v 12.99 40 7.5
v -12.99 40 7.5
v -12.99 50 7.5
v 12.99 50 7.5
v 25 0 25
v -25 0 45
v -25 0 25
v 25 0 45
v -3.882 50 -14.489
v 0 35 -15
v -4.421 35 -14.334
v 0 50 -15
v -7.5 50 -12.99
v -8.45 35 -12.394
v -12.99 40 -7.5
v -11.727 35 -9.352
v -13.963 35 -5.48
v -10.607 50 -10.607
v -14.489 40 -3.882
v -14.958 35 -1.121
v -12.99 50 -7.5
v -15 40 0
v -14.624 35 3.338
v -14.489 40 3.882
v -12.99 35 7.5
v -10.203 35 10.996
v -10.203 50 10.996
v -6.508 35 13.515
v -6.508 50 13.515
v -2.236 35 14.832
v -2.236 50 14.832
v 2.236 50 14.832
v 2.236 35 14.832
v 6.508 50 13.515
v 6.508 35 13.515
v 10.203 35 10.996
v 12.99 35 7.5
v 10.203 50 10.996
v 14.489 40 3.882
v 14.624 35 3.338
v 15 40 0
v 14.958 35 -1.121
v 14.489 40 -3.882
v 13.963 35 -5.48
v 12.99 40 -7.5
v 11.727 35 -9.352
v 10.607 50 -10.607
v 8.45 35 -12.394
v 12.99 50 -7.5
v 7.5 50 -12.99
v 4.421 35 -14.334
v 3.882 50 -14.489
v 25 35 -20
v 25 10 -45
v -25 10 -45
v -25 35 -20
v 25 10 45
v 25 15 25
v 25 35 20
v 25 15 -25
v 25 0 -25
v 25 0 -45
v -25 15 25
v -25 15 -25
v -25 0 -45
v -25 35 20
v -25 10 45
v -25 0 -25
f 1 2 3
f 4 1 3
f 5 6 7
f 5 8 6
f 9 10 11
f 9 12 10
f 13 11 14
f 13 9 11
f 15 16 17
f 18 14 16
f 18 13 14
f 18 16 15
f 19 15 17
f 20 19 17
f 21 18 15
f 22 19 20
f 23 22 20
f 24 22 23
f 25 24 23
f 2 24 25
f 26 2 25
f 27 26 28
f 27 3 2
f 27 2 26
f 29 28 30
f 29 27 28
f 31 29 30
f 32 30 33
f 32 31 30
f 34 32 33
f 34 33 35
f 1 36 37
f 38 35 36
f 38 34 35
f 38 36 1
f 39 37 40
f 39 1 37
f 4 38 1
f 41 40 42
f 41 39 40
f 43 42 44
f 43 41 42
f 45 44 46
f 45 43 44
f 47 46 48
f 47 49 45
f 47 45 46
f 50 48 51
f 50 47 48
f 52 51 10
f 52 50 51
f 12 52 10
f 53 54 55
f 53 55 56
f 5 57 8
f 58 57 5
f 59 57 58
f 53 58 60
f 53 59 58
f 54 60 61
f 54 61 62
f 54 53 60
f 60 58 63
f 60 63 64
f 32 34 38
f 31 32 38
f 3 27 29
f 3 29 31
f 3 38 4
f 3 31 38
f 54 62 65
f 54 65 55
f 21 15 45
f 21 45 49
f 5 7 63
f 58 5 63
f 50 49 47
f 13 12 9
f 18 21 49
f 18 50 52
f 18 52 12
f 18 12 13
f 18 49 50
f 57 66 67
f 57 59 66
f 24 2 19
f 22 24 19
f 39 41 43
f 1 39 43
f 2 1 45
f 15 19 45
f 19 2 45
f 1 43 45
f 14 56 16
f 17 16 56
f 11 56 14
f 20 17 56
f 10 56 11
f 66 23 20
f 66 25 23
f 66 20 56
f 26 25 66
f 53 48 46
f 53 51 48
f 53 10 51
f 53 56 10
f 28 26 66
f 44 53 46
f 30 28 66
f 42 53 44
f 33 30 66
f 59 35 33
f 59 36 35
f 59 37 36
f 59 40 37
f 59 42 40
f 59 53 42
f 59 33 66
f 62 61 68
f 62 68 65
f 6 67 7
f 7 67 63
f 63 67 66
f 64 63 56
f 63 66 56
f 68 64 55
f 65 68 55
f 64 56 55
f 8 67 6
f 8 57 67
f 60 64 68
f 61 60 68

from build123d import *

# Parameters (mm, degrees)
SALIENTE_EXTRUIR1_DEPTH                = 25
CORTAR_EXTRUIR1_REACH                  = 73.764
CORTAR_EXTRUIR1_END_RADIUS             = 15
CROQUIS5_W                             = 15
CROQUIS5_H                             = 10
CORTAR_EXTRUIR1_DIRECTION_2_REACH      = 73.764
CORTAR_EXTRUIR1_DIRECTION_2_END_RADIUS = 15


with BuildPart() as part:
    # Croquis2 → Saliente-Extruir1 (new, symmetric)
    with BuildSketch(Plane(origin=(0, 0, 0), x_dir=(0, 0, -1), z_dir=(1, 0, 0))):
        Polygon((-45, 0), (-25, 0), (-25, 15), (25, 15), (25, 0), (45, 0), (45, 10), (20, 35), (-20, 35), (-45, 10), align=None)
    extrude(amount=SALIENTE_EXTRUIR1_DEPTH, both=True)

    # Croquis3 → Revolución2 (revolve)
    with BuildSketch(Plane(origin=(0, 0, 0), x_dir=(0, 0, -1), z_dir=(1, 0, 0))):
        Polygon((0, 35), (15, 35), (15, 50), (7.5, 50), (7.5, 40), (0, 40), align=None)
    revolve(axis=Axis((0, -6.406995379, 0), (0, 1, 0)))

    # Cortar-Extruir1: up to this cylinder (the profile starts inside it)
    cortar_extruir1_end = Plane(origin=(0, 45, 0), z_dir=(0, -1, 0)) * Cylinder(CORTAR_EXTRUIR1_END_RADIUS, 178.528, mode=Mode.PRIVATE)
    # Croquis5 → Cortar-Extruir1 (cut, up to the surface)
    with BuildSketch(Plane(origin=(0, 0, 0), x_dir=(0, 0, -1), z_dir=(1, 0, 0)), mode=Mode.PRIVATE) as cortar_extruir1_sk1:
        with Locations((0, 45)):
            Rectangle(CROQUIS5_W, CROQUIS5_H)
    cortar_extruir1_tool1 = extrude(cortar_extruir1_sk1.sketch, amount=-CORTAR_EXTRUIR1_REACH, mode=Mode.PRIVATE) & cortar_extruir1_end
    add(cortar_extruir1_tool1.solids().sort_by_distance((0, 45, 0))[0], mode=Mode.SUBTRACT)

    # Cortar-Extruir1 direction 2: up to this cylinder (the profile starts inside it)
    cortar_extruir1_direction_2_end = Plane(origin=(0, 45, 0), z_dir=(0, -1, 0)) * Cylinder(CORTAR_EXTRUIR1_DIRECTION_2_END_RADIUS, 178.528, mode=Mode.PRIVATE)
    # Croquis5 → Cortar-Extruir1 direction 2 (cut, up to the surface)
    with BuildSketch(Plane(origin=(0, 0, 0), x_dir=(0, 0, -1), z_dir=(1, 0, 0)), mode=Mode.PRIVATE) as cortar_extruir1_direction_2_sk1:
        with Locations((0, 45)):
            Rectangle(CROQUIS5_W, CROQUIS5_H)
    cortar_extruir1_direction_2_tool1 = extrude(cortar_extruir1_direction_2_sk1.sketch, amount=CORTAR_EXTRUIR1_DIRECTION_2_REACH, mode=Mode.PRIVATE) & cortar_extruir1_direction_2_end
    add(cortar_extruir1_direction_2_tool1.solids().sort_by_distance((0, 45, 0))[0], mode=Mode.SUBTRACT)


solid = part.part
